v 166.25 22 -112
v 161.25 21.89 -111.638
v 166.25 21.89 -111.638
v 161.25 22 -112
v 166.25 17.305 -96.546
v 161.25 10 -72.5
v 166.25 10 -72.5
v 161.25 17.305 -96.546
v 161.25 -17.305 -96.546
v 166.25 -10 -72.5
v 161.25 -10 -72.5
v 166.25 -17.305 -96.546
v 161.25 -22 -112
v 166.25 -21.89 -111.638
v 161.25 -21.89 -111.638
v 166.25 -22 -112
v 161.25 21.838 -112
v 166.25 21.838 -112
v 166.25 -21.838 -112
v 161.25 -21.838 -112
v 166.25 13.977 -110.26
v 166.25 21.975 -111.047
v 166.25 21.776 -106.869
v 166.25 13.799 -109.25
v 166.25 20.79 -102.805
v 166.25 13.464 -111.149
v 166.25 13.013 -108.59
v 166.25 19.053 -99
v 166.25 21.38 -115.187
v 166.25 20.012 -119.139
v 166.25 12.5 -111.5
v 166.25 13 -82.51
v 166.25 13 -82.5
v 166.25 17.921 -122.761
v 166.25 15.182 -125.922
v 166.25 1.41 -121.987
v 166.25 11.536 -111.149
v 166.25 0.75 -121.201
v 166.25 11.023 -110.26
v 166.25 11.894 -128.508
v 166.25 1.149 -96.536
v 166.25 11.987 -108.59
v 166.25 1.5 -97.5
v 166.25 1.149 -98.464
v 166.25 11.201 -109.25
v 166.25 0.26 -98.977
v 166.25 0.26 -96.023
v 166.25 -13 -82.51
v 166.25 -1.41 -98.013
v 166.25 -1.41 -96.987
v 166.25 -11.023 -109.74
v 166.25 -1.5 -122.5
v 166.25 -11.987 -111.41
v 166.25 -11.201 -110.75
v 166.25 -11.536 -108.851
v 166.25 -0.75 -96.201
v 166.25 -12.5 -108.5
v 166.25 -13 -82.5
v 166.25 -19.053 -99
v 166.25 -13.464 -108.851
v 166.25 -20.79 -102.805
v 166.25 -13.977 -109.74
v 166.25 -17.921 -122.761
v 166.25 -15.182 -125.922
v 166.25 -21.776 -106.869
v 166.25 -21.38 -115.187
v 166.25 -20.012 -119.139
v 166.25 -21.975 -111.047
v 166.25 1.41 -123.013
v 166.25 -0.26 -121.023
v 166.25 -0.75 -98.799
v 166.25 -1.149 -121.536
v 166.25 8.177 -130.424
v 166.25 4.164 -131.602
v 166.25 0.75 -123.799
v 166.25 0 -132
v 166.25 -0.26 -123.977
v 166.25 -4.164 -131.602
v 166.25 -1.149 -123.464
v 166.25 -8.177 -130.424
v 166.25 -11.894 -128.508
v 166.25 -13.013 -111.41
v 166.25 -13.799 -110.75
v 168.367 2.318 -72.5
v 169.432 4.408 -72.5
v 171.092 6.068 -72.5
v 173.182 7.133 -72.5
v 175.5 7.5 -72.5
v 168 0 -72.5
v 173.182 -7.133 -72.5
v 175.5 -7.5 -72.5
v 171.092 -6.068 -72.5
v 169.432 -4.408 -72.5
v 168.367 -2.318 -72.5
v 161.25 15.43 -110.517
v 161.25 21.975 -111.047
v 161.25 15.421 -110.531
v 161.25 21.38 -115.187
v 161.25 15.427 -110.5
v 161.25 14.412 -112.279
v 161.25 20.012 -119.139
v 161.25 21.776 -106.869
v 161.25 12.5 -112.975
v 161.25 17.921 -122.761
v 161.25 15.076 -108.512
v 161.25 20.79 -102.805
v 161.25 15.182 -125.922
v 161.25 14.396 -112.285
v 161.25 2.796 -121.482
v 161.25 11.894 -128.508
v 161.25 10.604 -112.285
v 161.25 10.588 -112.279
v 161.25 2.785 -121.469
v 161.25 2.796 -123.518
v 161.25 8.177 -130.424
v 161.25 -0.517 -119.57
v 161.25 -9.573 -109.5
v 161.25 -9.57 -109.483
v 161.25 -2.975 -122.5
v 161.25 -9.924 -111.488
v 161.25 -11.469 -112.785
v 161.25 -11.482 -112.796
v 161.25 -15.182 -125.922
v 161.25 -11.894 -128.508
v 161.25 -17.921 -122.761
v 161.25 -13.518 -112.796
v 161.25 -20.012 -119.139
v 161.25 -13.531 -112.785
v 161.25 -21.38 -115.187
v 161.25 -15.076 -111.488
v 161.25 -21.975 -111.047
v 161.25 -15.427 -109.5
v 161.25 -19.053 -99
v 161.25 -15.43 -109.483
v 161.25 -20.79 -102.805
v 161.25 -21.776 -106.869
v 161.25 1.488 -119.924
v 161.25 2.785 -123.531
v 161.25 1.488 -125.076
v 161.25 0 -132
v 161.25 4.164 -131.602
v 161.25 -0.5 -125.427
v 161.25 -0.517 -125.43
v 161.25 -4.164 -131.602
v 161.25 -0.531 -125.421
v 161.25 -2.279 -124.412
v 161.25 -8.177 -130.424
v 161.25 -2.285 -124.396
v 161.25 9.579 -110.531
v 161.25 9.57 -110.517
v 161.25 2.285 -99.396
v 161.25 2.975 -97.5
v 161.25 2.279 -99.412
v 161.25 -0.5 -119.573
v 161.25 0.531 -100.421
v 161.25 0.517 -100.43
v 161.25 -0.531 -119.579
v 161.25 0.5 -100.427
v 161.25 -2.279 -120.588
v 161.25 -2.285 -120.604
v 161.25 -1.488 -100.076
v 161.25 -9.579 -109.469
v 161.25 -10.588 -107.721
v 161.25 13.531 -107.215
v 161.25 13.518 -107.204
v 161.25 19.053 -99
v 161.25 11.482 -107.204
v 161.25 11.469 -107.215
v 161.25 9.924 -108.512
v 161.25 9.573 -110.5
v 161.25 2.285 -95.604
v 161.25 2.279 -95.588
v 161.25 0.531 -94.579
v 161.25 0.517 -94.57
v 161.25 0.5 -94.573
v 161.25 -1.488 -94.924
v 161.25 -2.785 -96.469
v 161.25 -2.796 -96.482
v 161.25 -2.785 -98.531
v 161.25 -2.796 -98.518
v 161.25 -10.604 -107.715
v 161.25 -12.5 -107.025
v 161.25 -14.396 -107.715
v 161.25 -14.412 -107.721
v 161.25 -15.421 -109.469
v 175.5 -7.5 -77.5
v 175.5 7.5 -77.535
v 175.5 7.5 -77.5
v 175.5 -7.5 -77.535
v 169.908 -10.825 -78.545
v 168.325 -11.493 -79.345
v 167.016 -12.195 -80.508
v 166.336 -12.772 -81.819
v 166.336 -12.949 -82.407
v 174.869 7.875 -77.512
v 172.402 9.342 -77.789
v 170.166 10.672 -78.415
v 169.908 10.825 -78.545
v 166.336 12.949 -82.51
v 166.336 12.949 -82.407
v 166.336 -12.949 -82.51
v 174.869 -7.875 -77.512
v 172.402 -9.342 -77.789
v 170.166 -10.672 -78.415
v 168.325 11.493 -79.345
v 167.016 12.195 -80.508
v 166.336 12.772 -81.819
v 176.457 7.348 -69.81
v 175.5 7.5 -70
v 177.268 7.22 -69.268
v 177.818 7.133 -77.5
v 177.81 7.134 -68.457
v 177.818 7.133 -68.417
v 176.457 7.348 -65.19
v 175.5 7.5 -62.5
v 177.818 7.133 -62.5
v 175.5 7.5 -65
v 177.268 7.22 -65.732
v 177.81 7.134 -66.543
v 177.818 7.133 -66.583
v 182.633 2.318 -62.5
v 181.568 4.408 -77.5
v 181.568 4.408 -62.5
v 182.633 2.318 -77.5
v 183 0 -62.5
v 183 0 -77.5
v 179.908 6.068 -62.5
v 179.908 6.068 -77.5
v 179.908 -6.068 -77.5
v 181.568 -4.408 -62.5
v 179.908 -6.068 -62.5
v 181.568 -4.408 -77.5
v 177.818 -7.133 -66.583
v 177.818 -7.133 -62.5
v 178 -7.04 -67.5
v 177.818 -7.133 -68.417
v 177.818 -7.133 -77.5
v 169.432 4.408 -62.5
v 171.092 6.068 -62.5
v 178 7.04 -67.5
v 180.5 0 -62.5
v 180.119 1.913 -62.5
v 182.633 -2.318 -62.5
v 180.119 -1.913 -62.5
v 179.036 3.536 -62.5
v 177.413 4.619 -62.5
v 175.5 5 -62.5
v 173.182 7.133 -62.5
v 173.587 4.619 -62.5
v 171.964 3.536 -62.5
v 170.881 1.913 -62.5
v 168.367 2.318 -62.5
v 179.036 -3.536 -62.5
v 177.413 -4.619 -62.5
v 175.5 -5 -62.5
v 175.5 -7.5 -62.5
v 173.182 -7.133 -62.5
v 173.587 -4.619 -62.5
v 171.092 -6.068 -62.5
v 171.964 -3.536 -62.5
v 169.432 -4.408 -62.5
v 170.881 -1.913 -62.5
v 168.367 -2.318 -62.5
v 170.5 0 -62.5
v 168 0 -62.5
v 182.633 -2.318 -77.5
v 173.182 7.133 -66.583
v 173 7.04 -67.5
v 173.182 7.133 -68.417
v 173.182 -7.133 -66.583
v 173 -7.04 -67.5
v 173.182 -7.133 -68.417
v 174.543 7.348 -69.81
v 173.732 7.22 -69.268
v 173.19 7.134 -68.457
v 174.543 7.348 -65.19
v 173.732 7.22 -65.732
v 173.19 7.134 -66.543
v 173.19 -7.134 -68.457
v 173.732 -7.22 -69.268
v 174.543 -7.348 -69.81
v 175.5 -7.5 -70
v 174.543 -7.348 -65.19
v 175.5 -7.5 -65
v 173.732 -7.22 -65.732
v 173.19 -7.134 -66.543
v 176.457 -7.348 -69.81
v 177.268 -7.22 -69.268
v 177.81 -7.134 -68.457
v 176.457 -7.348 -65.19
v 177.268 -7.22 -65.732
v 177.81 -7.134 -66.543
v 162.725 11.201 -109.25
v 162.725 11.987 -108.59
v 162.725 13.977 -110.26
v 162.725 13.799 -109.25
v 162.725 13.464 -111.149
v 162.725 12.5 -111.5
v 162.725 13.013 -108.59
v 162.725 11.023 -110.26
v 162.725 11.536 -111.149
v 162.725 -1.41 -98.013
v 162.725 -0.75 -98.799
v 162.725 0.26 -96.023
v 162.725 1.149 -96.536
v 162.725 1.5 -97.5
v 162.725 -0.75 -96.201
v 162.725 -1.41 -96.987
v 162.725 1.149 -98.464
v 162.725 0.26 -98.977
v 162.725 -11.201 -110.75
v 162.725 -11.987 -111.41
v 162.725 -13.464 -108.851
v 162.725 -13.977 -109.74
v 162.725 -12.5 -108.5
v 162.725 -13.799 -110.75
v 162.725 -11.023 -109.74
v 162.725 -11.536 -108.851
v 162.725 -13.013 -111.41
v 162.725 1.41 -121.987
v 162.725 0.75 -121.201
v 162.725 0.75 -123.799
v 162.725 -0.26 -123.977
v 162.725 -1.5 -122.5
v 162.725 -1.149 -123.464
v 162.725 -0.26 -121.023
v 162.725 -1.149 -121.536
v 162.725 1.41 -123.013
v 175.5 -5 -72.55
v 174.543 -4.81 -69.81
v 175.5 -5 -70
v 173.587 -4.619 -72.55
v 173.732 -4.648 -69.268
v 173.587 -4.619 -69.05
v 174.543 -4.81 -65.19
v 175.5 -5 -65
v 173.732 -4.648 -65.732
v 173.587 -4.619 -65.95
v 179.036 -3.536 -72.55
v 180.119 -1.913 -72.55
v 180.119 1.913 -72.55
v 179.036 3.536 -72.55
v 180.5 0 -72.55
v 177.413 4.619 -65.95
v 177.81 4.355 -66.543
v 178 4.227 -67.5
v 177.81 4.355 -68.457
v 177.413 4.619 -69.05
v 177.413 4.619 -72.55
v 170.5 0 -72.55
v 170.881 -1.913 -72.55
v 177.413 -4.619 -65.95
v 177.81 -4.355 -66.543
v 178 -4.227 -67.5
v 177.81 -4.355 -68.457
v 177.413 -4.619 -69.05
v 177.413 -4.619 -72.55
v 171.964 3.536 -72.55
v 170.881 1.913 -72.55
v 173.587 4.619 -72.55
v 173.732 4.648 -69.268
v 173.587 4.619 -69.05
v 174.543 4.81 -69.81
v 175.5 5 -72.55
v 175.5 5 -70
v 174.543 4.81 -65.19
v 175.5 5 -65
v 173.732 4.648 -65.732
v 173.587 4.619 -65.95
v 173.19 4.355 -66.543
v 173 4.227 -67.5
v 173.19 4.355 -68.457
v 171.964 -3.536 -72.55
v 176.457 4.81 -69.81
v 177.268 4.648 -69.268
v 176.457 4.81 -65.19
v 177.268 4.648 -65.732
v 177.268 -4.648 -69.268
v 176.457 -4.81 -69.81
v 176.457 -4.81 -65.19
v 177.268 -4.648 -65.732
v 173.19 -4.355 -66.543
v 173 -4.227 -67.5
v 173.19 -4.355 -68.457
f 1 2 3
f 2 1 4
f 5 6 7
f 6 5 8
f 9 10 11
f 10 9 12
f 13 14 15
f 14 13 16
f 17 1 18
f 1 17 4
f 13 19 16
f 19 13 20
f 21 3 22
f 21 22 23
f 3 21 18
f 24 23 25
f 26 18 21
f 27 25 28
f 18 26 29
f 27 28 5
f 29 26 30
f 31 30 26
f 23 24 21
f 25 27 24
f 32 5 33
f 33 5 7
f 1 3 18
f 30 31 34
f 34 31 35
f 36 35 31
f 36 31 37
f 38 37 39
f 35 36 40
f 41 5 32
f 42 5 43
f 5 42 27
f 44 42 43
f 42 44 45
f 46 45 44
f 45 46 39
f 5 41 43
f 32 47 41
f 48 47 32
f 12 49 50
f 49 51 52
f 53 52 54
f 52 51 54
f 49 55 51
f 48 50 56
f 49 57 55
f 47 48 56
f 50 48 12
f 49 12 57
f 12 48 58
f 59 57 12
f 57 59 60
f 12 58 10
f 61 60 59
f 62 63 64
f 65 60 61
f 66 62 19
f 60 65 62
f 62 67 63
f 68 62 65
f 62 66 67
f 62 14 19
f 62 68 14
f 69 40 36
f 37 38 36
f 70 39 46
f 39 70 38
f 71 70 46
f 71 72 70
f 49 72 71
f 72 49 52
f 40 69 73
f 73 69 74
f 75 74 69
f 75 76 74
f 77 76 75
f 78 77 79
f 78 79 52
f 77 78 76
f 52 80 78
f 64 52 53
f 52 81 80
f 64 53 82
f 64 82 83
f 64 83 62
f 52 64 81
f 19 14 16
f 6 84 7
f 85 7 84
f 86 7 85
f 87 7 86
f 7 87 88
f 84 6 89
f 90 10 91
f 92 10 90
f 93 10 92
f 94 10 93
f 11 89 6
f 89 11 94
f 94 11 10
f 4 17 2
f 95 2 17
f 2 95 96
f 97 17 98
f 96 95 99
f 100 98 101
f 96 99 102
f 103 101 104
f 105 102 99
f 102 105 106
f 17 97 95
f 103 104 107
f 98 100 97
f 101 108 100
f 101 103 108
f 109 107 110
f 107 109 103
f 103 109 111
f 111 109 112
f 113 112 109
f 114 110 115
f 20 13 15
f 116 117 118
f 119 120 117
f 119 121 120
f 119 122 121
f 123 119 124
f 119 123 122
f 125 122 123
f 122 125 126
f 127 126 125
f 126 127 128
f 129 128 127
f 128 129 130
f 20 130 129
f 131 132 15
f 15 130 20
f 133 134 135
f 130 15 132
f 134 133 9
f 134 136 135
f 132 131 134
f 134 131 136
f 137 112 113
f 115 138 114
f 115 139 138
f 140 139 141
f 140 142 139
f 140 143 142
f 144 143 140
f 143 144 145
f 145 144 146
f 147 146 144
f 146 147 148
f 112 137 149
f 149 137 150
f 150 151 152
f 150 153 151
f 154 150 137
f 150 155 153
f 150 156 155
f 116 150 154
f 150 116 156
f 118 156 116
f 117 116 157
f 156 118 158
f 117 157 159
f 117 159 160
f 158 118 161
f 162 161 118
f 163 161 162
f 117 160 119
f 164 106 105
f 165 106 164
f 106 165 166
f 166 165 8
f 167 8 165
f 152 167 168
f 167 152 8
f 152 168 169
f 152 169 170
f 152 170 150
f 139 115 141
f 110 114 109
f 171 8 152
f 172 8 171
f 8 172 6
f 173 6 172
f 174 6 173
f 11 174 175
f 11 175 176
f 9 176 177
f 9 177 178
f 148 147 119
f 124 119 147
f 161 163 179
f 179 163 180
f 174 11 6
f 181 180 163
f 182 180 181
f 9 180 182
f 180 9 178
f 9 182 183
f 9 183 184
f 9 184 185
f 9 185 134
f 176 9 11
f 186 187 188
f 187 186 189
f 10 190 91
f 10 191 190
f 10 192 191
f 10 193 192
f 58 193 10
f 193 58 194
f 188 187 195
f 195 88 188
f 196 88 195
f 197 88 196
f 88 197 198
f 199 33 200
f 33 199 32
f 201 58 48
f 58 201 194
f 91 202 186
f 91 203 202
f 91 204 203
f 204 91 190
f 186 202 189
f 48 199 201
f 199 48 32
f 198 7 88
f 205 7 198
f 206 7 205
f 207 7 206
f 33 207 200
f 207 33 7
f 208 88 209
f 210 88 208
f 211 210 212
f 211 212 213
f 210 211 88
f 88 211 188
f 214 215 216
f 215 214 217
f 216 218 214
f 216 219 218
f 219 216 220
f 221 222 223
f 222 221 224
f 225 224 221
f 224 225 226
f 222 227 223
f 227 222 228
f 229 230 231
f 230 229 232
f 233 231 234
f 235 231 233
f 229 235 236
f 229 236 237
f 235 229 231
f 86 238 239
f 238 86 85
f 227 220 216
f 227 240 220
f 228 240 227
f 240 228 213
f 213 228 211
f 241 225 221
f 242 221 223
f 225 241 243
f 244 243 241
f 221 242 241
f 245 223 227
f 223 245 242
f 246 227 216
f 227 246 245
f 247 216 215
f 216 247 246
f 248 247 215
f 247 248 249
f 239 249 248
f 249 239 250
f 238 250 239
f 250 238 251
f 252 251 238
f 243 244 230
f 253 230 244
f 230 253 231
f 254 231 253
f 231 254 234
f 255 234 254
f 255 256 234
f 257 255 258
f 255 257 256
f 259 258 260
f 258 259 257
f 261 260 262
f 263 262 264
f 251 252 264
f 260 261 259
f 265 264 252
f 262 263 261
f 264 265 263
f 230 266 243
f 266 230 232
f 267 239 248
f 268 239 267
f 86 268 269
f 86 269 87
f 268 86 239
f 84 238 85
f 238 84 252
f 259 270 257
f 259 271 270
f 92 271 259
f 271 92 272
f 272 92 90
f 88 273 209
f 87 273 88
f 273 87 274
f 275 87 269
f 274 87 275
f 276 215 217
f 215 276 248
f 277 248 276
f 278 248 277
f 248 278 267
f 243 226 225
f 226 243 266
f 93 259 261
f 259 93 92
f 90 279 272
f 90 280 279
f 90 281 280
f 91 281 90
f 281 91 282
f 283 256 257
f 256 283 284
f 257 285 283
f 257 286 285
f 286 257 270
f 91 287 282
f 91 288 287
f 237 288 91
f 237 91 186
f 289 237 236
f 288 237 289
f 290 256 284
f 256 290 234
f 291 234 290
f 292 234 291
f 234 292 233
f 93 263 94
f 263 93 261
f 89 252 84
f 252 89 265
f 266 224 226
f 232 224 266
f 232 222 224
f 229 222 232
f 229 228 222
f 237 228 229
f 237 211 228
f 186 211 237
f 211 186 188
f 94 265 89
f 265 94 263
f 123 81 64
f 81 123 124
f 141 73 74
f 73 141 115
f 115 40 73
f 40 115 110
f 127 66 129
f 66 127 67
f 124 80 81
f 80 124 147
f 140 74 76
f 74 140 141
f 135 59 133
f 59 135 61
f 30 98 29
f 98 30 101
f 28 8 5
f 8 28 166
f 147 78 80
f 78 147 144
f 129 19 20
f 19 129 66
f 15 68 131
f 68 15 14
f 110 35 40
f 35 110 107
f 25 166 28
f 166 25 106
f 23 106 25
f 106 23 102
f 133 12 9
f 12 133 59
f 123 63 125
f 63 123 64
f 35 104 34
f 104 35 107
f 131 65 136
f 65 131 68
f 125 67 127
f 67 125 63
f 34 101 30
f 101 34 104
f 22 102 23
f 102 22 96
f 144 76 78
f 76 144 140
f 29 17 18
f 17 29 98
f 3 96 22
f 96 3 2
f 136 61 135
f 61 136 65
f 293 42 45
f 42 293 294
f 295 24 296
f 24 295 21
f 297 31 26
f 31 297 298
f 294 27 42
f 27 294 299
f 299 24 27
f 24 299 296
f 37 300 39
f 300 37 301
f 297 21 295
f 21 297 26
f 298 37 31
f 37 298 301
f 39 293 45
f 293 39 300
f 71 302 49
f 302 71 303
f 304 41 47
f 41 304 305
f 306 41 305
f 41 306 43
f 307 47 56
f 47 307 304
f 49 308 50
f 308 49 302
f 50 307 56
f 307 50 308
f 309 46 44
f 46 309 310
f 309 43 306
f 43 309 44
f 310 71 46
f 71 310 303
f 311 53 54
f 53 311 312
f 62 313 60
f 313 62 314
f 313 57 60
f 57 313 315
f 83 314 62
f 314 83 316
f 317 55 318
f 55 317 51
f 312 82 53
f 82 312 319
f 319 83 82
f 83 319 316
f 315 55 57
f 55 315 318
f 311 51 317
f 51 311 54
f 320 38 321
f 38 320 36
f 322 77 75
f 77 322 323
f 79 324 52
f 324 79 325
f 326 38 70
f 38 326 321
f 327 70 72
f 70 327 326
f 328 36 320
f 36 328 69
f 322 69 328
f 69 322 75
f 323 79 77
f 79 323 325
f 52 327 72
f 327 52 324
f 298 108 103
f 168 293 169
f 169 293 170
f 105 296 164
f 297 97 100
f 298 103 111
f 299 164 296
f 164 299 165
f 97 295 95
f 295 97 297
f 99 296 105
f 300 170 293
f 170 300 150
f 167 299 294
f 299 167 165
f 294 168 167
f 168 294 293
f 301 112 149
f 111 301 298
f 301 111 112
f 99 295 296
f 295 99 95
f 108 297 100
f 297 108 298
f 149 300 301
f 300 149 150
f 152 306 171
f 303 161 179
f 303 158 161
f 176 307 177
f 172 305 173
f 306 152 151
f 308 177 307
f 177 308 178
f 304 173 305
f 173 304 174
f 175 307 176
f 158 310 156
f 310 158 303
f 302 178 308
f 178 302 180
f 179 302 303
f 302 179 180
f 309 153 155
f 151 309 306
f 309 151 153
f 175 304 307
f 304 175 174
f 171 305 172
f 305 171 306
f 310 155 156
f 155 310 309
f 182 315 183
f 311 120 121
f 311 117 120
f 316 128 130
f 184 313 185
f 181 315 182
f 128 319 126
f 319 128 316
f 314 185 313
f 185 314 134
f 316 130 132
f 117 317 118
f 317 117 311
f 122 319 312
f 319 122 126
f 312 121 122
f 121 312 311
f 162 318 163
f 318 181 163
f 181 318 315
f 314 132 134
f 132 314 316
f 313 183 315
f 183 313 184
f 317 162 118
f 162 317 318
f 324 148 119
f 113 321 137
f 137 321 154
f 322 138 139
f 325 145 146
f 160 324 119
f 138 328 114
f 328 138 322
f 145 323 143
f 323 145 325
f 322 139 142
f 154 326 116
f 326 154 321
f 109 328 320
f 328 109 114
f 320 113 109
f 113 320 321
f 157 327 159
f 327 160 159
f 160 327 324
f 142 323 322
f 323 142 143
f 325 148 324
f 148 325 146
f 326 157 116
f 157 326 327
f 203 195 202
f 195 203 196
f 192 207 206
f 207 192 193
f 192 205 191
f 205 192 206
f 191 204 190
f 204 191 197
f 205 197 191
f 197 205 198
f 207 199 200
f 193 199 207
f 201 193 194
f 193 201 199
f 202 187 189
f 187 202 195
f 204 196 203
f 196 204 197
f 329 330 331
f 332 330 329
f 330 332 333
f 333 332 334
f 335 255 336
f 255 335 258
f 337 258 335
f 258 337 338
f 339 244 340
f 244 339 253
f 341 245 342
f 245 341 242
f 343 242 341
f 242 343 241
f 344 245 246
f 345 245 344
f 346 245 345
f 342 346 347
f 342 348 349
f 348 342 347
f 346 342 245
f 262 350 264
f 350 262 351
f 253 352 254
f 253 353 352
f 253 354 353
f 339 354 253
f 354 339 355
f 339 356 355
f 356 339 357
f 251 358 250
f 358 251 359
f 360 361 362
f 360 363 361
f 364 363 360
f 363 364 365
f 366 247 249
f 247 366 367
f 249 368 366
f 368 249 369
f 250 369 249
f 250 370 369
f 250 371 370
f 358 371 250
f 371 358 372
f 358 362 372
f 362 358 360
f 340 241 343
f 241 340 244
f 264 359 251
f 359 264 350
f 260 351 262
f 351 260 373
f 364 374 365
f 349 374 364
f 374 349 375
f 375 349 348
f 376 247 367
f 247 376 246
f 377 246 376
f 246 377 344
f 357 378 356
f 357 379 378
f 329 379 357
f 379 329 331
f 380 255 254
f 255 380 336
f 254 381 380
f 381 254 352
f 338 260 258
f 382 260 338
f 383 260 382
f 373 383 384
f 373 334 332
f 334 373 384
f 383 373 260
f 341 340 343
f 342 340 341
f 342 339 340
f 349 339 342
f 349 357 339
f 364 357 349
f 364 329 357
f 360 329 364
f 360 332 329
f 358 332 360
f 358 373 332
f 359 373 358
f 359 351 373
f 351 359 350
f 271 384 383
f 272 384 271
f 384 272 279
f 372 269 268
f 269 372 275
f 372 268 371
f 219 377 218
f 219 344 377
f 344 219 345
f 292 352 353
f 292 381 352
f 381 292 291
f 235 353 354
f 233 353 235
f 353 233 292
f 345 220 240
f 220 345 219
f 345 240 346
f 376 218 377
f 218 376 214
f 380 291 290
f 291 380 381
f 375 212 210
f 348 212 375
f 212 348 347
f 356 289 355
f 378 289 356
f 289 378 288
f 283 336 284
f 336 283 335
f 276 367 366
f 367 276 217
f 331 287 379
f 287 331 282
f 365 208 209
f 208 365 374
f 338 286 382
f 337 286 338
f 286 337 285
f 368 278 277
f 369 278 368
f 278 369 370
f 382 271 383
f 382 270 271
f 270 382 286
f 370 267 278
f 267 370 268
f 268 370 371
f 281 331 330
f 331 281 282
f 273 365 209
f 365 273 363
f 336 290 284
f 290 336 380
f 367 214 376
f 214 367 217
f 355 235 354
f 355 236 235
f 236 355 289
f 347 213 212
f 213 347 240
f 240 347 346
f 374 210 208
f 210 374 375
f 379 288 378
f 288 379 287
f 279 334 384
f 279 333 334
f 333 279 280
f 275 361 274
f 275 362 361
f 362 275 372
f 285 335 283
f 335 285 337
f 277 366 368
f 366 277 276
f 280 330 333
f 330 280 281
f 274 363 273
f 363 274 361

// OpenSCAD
// file: ../motors/MN5212.scad
use <../utils.scad>

module MN5212(){

	//render(){
		difference(){
			union(){
				translate([0,0, 42.5 / 2 - 23 / 2 - 4.9 - 6])
					cylinder(
						h = 23,
						r = 59 / 2,
						$fa = fa(59 / 2),
						center = true);
				translate([0,0, 42.5 / 2 - 4.9 / 2 - 6])
					cylinder(
						h = 4.9,
						r1 = 59 / 2,
						r2 = 24.8 / 2,
						$fa = fa(59 / 2),
						center = true);
				translate([0,0, - 42.5 / 2 + 5.6 / 2 + 3])
					cylinder(
						h = 5.6,
						r1 = 44 / 2,
						r2 = 59 / 2,
						$fa = fa(59 / 2),
						center = true);
				translate([0, 0, 42.5 / 2 - 3])
					cylinder(
						h = 6,
						r = 4 / 2,
						$fa = fa(4 / 2),
						center = true);
				translate([0, 0, - 42.5 / 2 + 1.5])
					cylinder(
						h = 3,
						r = 6 / 2,
						$fa = fa(6 / 2),
						center = true);
			}
			union(){
				for(i = [0:90:270])
					rotate([0, 0, i])
						translate([0, 25 / 2, -16.25 - 0.025])
							cylinder(
								h = 4,
								r = 3 / 2,
								$fa = fa(3 / 2),
								center = true);
				for(i = [0:120:240])
					rotate([0, 0, i])
						translate([0, 17 / 2, 12.75 + 0.025])
							cylinder(
								h = 5,
								r = 3 / 2,
								$fa = fa(3 / 2),
								center = true);
				rotate([0, 0, 30])
					translate([0, 12 / 2, 12.75 + 0.025])
						cylinder(
							h = 5,
							r = 3 / 2,
							$fa = fa(3 / 2),
							center = true);
				rotate([0, 0, 30 + 180])
					translate([0, 12 / 2, 12.75 + 0.025])
						cylinder(
							h = 5,
							r = 3 / 2,
							$fa = fa(3 / 2),
							center = true);
			}
		}

	//}

}

MN5212();
// file: ../servos/TGY_4805_2PA.scad
use <../utils.scad>

module TGY_4805_2PA(){

	length = 40;
	width = 20;
	depth = 38.7;
	wing_width = 58;
	wing_thick = 4;
	shaft_offset = 6;
	hole_spacing = 50;
	shaft_height = 42;
	shaft_length = 2;

	module mounting_hole(){
		mh_rad = 2 / 2;
		translate(
			[
				hole_spacing / 2,
				0,
				depth / 2 - wing_thick / 2
			])
			cylinder(h = 5, r = mh_rad, $fa = fa(mh_rad), center = true);
	}

	difference(){
		union(){
			cube([length, width, depth], center = true);
			translate([0, 0, depth / 2 - wing_thick / 2])
				cube([wing_width, width, wing_thick], center = true);
			translate(
				[
					- length / 2 + shaft_offset,
					0,
					shaft_height - length / 2 + shaft_length / 2
				])
				cylinder(
					h = shaft_length,
					r = 1.5,
					$fa = fa(1.5),
					center = true);
		}	union(){

			mounting_hole();
			mirror() mounting_hole();
		}
	}
}

TGY_4805_2PA();
// file: ../servos/HS_5065MG.scad
use <../utils.scad>

module HS_5065MG(){

	length = 23.75;
	width = 11.68;
	depth = 20.32;
	wing_width = 32.38;
	wing_thick = 3.43;
	shaft_offset = 6;
	hole_spacing = 28.32;
	shaft_height = 26.16;
	shaft_length = 2;

	module mounting_hole(){
		mh_rad = 2 / 2;
		translate(
			[
				hole_spacing / 2,
				0,
				depth / 2 - wing_thick / 2
			])
			cylinder(h = 5, r = mh_rad, $fa = fa(mh_rad), center = true);
	}

	difference(){
		union(){
			cube([length, width, depth], center = true);
			translate([0, 0, depth / 2 - wing_thick / 2])
				cube([wing_width, width, wing_thick], center = true);
			translate(
				[
					- length / 2 + shaft_offset,
					0,
					shaft_height - length / 2 + shaft_length / 2
				])
				cylinder(
					h = shaft_length,
					r = 1.5,
					$fa = fa(1.5),
					center = true);
		}	union(){

			mounting_hole();
			mirror() mounting_hole();
		}
	}
}

HS_5065MG();
// file: ../servos/LS_0006_servo.scad
// Author Michael Marques (DrYerzinia)

use <../utils.scad>

module ls_0006_servo(){
	
	length = 21.4;
	depth = 19.9;
	thickness = 11.65;

	gear_height = 2.6;
	gear_bump_height = 0.7;
	gear_bump_diameter = 1.97;
	gear_outer_bump_diameter = 6;
	gear_bump_offset = 12.2;

	shaft_height = 2.4;
	shaft_diameter = 3.74;
	shaft_offset = thickness / 2;
	shaft_screw_diameter = 1.3;
	
	wing_outer_width = 8.5;
	wing_top_off = 3.8;
	wing_length = 3.8;
	wing_thickness = 1.2;
	wing_hole_diameter = 1.85;
	wing_hole_edge_dist = 2;

	module wing_hole(){
		translate(
			[
				length / 2 + wing_hole_edge_dist,
				0,
				depth/2 - wing_top_off - wing_thickness / 2
			])
			cylinder(
				h = wing_thickness + 1,
				r = wing_hole_diameter / 2,
				$fn = 16,
				center = true);
	}

	module wing(){
		translate(
			[
				length / 2,
				thickness / 2,
				depth/2 - wing_top_off - wing_thickness
			])
			rotate([0,0,-90])
				trapezoid(
					thickness,
					wing_outer_width,
					wing_length,
					wing_thickness);
	}

	// Body
	cube([length, thickness, depth], center = true);

	difference(){
		union(){

			wing();
			mirror() wing();

			// Gear Bumps
			translate([0, 0, depth/2 + gear_height / 2]){
				translate([length / 2 - gear_bump_offset, 0, 0])
					cylinder(
						h = gear_height,
						r = gear_outer_bump_diameter / 2,
						$fn = 16,
						center = true);
				translate([length / 2 - gear_bump_offset, 0, gear_height/2 + gear_bump_height / 2])
					cylinder(
						h = gear_bump_height,
						r = gear_bump_diameter / 2,
						$fn = 16,
						center = true);
				translate([length / 2 - shaft_offset, 0, 0])
					cylinder(
						h = gear_height,
						r = thickness / 2,
						$fn = 32,
						center = true);
				// Shaft
				translate([length / 2 - shaft_offset, 0, gear_height])
					cylinder(
						h = shaft_height,
						r = shaft_diameter / 2,
						$fn = 16,
						center = true);
			}

		}
		union(){

			wing_hole();
			mirror() wing_hole();

			// Shaft_hole
			translate(
				[
					length / 2 - shaft_offset,
					0,
					depth/2 + gear_height * (3 / 2) + 0.5])
				cylinder(
					h = shaft_height + 1,
					r = shaft_screw_diameter / 2,
					$fn = 16,
					center = true);

		}
	}

}

module translate_ls_0006_attachment(){

	length = 21.4;
	thickness = 11.65;
	shaft_offset = thickness / 2;
	depth = 19.9;
	float = 3.3;

	translate([length / 2 - shaft_offset, 0, depth / 2 + float])
		children();

}

module bar_attachment(){

	height = 3.75;
	bar_length = 14.7;
	bar_thickness = 1.6;
	inner_radius = 5.9;
	outer_radius = 3.95;
	shaft_diameter = 3.7;
	upper_void_diameter = 4.8;
	screw_diameter = 2;
	hole_spacing = 2;
	hole_4_diameter = 1.2;
	hole_diameter = 1;
	hole_start_off = 4.7;
	top_void_depth = 0.67;
	bottom_void_depth = 1.84;

	translate([0, 0, height / 2]){
		difference(){
			union(){

				translate([0, inner_radius / 2, height / 2 - bar_thickness])
					rotate([0,0,-90])
						trapezoid(
							inner_radius,
							outer_radius,
							bar_length,
							bar_thickness);

				cylinder(
					h = height,
					r = inner_radius / 2,
					$fn = 16,
					center = true);

				translate([bar_length, 0, height / 2 - bar_thickness / 2])
					cylinder(
						h = bar_thickness,
						r = outer_radius / 2,
						$fn = 16,
						center = true);

			}
			union(){
				// screwhole
				cylinder(
					h = height + 1,
					r = screw_diameter / 2,
					$fn = 16,
					center = true);
				// voids
				translate([0, 0, height / 2 - top_void_depth / 2 + 0.5])
					cylinder(
						h = top_void_depth + 1,
						r = upper_void_diameter / 2,
						$fn = 16,
						center = true);
				translate([0, 0,  - bottom_void_depth / 2 - 0.5])
					cylinder(
						h = bottom_void_depth + 1,
						r = shaft_diameter / 2,
						$fn = 16,
						center = true);

				for(i = [0:4]){
					dia = (i != 3) ? hole_diameter : hole_4_diameter;
					translate(
						[
							hole_start_off + hole_spacing * i,
							0,
							height / 2 - bar_thickness / 2])
						cylinder(
							h = bar_thickness + 1,
							r = dia / 2,
							$fn = 16,
							center = true);
				}

			}
		}
	}

}

ls_0006_servo();
translate_ls_0006_attachment() bar_attachment();
// file: ../servos/parallax_continuous_rotation_servo.scad
// Author Michael Marques (DrYerzinia)

module parallax_continuous_rotation_servo(){

	depth = 37.7;
	length = 40.75;
	width = 19.75;

	mount_height = 2.7;
	mount_extent = 6.1;
	mount_from_top = 7.7;

	mount_hole_diameter = 4.46;
	mount_hole_spacing = 14.4 - mount_hole_diameter;

	shaft_diameter = 5.8;
	shaft_offset = 10;
	shaft_length = 3.5;

	module mounting_hole(){

			translate(
				[
					length / 2 + 5,
					mount_hole_spacing / 2,
					depth / 2 - mount_height / 2 - mount_from_top
				]
				)
				cylinder(
					h = mount_height + 1,
					r = mount_hole_diameter / 2,
					$fn=16,
					center = true);
	}

	difference(){
		union(){

			// Body
			cube([length,width,depth], center = true);

			// Mounting wings
			translate(
				[
					0,
					0,
					depth / 2 - mount_height / 2 - mount_from_top
				])
				cube(
					[
						length + mount_extent * 2,
						width,
						mount_height
					],
					center = true);

			// Shaft
			translate(
				[
					length / 2 - shaft_offset,
					0,
					depth / 2 + shaft_length / 2
				]
				)
				cylinder(
					h = shaft_length,
					r = shaft_diameter / 2,
					$fn = 16,
					center = true
				);

		}
		union(){

			// Mounting Holes
			mounting_hole();
			mirror()
				mounting_hole();

			translate([0,-mount_hole_spacing,0]){
				mounting_hole();
				mirror()
					mounting_hole();
			}
		}
	}

}

module translate_shaft(){

	depth = 37.7;
	length = 40.75;

	shaft_offset = 10;

	translate(
		[
			length / 2 - shaft_offset,
			0,
			depth / 2
		])
		children();
}

module round_servo_attachment(){

	height = 6;
	diameter = 20.8;
	inner_diameter = 8.6;
	plate_thickness = 2.45;

	float = 2;

	depth = 37.7;
	length = 40.75;

	shaft_offset = 10;

	plate_hole_spacing = 14.5;
	plate_hole_diameter = 1.4;
	plate_hole_minor_spacing = 3.5;

	screw_hole_diameter = 3;

	inner_diameter = 8;
	
	top_depth = 1.8;
	bottom_depth = 3.4;

	void_diameter = 5.8;

	module plate_hole(){
		cylinder(
			h = plate_thickness + 1,
			r = plate_hole_diameter / 2,
			$fn = 16,
			center = true
		);
	}

	module plate_hole_group(){
		translate([0, 0, height / 2 - plate_thickness / 2]){
			translate([0, plate_hole_spacing / 2, 0]){
					plate_hole();
					translate([- plate_hole_minor_spacing, 0, 0])
						plate_hole();
					translate([  plate_hole_minor_spacing, 0, 0])
						plate_hole();
			}
		}
	}

	translate(
		[
			length / 2 - shaft_offset,
			0,
			depth / 2 + height / 2 + float
		]
		)
		difference(){

			union(){

				// inner shaft
				cylinder(
					h = height,
					r = inner_diameter / 2,
					$fn = 16,
					center = true
				);

				// top
				translate([0, 0, height / 2 - plate_thickness / 2])
					cylinder(
						h = plate_thickness,
						r = diameter / 2,
						$fn = 32,
						center = true
					);
			}

			union(){

				// plate holes
				for(ang = [0:3]){
					rotate([0,0, ang * 90])
						plate_hole_group();
				}

				// screw hole
				cylinder(
					h = height + 1,
					r = screw_hole_diameter / 2,
					$fn = 16,
					center = true
				);

				// inner voids
				translate([0, 0, height / 2 - top_depth / 2 + 1])
					cylinder(
						h = top_depth + 1,
						r = void_diameter / 2,
						$fn = 16,
						center = true
					);
				translate([0, 0, -1])
					cylinder(
						h = bottom_depth + 1,
						r = void_diameter / 2,
						$fn = 16,
						center = true
					);

			}

		}

}

parallax_continuous_rotation_servo();
round_servo_attachment();
// file: ../hardware.scad
 // Author Michael Marques (DrYerzinia)

// http://www.ebay.com/itm/10-PCS-683-3x7x2-mm-Metal-OPEN-PRECISION-Miniature-Ball-Bearing-3-7-2-/291206307942?hash=item43cd3fa066:m:mCi6eovrGVk_CjIUjlhw8yg
// E-Bay empire.rc

module washer_M3_7x3_2x0_5mm(){

	difference(){
		cylinder(
			h = 0.5,
			r = 7 / 2,
			$fn = 16,
			center = true);
		cylinder(
			h = 0.5 + 0.1,
			r = 3.2 / 2,
			$fn = 16,
			center = true);
	}

}

module bearing_3x7x2mm(){

	difference(){
		cylinder(
			h = 2,
			r = 7 / 2,
			$fn = 16,
			center = true);
		cylinder(
			h = 2 + 1,
			r = 3 / 2,
			$fn = 16,
			center = true);
	}

}

module bearing_5x8x2_5mm(){

	difference(){
		cylinder(
			h = 2.5,
			r = 8 / 2,
			$fn = 16,
			center = true);
		cylinder(
			h = 2.5 + 1,
			r = 5 / 2,
			$fn = 16,
			center = true);
	}

}

module bearing_8x16x5mm(){

	difference(){
		cylinder(
			h = 5,
			r = 16 / 2,
			$fn = 16,
			center = true);
		cylinder(
			h = 5 + 1,
			r = 8 / 2,
			$fn = 16,
			center = true);
	}

}


bearing_5x8x2_5mm();
// file: ../utils.scad
// http://forum.openscad.org/Creating-pie-pizza-slice-shape-need-a-dynamic-length-array-td3148.html

module pie_slice(r, start_angle, end_angle) {
    R = r * sqrt(2) + 1;
    a0 = (4 * start_angle + 0 * end_angle) / 4;
    a1 = (3 * start_angle + 1 * end_angle) / 4;
    a2 = (2 * start_angle + 2 * end_angle) / 4;
    a3 = (1 * start_angle + 3 * end_angle) / 4;
    a4 = (0 * start_angle + 4 * end_angle) / 4;
    if(end_angle > start_angle)
        intersection() {
        circle(r, $fa = fa(r));
        polygon([
            [0,0],
            [R * cos(a0), R * sin(a0)],
            [R * cos(a1), R * sin(a1)],
            [R * cos(a2), R * sin(a2)],
            [R * cos(a3), R * sin(a3)],
            [R * cos(a4), R * sin(a4)],
            [0,0]
       ]);
    }
}

// https://github.com/openscad/openscad/issues/29

module rotate_about(v,a) {
	translate(v) rotate(a) translate(-v) children();
}

module rotate_about_axis(v, ang, axis) {
	translate(v) rotate(ang, axis) translate(-v) children();
}

// https://github.com/robofun/openscad-utils/blob/master/trapezoid.scad

module trapezoid(width_base, width_top, height, thickness){
	

  linear_extrude(height = thickness)
		polygon(
			points =
				[
					[0,0],
					[width_base,0],
					[width_base-(width_base-width_top)/2,height],
					[(width_base-width_top)/2,height]
				],
				paths=[[0,1,2,3]]); 
  
}

// http://forum.openscad.org/fe-Tolerance-based-arc-approximation-td14212.html

function fa(r)=($fn>0)?360/$fn:($fe>0)?($fe<r)?min(45,2*acos(1-$fe/r)):45:$fa; 
// file: ../render_settings.scad
// Author Michael Marques (DrYerzinia)

// Lulzbot Mini tolerances
// x/y 0.1mm
// z   0.05mm
//
// 0.1mm   preview tolerance
// 0.025mm export  tolerance

$fs = 0.01;
$fn = undef;
$fa = 360 / 5;

$fe = 0.025;	// export
// main file
// Author Michael Marques (DrYerzinia)

include <../render_settings.scad>

use <../BB8.scad>

Prop_P2_motor_mount();
